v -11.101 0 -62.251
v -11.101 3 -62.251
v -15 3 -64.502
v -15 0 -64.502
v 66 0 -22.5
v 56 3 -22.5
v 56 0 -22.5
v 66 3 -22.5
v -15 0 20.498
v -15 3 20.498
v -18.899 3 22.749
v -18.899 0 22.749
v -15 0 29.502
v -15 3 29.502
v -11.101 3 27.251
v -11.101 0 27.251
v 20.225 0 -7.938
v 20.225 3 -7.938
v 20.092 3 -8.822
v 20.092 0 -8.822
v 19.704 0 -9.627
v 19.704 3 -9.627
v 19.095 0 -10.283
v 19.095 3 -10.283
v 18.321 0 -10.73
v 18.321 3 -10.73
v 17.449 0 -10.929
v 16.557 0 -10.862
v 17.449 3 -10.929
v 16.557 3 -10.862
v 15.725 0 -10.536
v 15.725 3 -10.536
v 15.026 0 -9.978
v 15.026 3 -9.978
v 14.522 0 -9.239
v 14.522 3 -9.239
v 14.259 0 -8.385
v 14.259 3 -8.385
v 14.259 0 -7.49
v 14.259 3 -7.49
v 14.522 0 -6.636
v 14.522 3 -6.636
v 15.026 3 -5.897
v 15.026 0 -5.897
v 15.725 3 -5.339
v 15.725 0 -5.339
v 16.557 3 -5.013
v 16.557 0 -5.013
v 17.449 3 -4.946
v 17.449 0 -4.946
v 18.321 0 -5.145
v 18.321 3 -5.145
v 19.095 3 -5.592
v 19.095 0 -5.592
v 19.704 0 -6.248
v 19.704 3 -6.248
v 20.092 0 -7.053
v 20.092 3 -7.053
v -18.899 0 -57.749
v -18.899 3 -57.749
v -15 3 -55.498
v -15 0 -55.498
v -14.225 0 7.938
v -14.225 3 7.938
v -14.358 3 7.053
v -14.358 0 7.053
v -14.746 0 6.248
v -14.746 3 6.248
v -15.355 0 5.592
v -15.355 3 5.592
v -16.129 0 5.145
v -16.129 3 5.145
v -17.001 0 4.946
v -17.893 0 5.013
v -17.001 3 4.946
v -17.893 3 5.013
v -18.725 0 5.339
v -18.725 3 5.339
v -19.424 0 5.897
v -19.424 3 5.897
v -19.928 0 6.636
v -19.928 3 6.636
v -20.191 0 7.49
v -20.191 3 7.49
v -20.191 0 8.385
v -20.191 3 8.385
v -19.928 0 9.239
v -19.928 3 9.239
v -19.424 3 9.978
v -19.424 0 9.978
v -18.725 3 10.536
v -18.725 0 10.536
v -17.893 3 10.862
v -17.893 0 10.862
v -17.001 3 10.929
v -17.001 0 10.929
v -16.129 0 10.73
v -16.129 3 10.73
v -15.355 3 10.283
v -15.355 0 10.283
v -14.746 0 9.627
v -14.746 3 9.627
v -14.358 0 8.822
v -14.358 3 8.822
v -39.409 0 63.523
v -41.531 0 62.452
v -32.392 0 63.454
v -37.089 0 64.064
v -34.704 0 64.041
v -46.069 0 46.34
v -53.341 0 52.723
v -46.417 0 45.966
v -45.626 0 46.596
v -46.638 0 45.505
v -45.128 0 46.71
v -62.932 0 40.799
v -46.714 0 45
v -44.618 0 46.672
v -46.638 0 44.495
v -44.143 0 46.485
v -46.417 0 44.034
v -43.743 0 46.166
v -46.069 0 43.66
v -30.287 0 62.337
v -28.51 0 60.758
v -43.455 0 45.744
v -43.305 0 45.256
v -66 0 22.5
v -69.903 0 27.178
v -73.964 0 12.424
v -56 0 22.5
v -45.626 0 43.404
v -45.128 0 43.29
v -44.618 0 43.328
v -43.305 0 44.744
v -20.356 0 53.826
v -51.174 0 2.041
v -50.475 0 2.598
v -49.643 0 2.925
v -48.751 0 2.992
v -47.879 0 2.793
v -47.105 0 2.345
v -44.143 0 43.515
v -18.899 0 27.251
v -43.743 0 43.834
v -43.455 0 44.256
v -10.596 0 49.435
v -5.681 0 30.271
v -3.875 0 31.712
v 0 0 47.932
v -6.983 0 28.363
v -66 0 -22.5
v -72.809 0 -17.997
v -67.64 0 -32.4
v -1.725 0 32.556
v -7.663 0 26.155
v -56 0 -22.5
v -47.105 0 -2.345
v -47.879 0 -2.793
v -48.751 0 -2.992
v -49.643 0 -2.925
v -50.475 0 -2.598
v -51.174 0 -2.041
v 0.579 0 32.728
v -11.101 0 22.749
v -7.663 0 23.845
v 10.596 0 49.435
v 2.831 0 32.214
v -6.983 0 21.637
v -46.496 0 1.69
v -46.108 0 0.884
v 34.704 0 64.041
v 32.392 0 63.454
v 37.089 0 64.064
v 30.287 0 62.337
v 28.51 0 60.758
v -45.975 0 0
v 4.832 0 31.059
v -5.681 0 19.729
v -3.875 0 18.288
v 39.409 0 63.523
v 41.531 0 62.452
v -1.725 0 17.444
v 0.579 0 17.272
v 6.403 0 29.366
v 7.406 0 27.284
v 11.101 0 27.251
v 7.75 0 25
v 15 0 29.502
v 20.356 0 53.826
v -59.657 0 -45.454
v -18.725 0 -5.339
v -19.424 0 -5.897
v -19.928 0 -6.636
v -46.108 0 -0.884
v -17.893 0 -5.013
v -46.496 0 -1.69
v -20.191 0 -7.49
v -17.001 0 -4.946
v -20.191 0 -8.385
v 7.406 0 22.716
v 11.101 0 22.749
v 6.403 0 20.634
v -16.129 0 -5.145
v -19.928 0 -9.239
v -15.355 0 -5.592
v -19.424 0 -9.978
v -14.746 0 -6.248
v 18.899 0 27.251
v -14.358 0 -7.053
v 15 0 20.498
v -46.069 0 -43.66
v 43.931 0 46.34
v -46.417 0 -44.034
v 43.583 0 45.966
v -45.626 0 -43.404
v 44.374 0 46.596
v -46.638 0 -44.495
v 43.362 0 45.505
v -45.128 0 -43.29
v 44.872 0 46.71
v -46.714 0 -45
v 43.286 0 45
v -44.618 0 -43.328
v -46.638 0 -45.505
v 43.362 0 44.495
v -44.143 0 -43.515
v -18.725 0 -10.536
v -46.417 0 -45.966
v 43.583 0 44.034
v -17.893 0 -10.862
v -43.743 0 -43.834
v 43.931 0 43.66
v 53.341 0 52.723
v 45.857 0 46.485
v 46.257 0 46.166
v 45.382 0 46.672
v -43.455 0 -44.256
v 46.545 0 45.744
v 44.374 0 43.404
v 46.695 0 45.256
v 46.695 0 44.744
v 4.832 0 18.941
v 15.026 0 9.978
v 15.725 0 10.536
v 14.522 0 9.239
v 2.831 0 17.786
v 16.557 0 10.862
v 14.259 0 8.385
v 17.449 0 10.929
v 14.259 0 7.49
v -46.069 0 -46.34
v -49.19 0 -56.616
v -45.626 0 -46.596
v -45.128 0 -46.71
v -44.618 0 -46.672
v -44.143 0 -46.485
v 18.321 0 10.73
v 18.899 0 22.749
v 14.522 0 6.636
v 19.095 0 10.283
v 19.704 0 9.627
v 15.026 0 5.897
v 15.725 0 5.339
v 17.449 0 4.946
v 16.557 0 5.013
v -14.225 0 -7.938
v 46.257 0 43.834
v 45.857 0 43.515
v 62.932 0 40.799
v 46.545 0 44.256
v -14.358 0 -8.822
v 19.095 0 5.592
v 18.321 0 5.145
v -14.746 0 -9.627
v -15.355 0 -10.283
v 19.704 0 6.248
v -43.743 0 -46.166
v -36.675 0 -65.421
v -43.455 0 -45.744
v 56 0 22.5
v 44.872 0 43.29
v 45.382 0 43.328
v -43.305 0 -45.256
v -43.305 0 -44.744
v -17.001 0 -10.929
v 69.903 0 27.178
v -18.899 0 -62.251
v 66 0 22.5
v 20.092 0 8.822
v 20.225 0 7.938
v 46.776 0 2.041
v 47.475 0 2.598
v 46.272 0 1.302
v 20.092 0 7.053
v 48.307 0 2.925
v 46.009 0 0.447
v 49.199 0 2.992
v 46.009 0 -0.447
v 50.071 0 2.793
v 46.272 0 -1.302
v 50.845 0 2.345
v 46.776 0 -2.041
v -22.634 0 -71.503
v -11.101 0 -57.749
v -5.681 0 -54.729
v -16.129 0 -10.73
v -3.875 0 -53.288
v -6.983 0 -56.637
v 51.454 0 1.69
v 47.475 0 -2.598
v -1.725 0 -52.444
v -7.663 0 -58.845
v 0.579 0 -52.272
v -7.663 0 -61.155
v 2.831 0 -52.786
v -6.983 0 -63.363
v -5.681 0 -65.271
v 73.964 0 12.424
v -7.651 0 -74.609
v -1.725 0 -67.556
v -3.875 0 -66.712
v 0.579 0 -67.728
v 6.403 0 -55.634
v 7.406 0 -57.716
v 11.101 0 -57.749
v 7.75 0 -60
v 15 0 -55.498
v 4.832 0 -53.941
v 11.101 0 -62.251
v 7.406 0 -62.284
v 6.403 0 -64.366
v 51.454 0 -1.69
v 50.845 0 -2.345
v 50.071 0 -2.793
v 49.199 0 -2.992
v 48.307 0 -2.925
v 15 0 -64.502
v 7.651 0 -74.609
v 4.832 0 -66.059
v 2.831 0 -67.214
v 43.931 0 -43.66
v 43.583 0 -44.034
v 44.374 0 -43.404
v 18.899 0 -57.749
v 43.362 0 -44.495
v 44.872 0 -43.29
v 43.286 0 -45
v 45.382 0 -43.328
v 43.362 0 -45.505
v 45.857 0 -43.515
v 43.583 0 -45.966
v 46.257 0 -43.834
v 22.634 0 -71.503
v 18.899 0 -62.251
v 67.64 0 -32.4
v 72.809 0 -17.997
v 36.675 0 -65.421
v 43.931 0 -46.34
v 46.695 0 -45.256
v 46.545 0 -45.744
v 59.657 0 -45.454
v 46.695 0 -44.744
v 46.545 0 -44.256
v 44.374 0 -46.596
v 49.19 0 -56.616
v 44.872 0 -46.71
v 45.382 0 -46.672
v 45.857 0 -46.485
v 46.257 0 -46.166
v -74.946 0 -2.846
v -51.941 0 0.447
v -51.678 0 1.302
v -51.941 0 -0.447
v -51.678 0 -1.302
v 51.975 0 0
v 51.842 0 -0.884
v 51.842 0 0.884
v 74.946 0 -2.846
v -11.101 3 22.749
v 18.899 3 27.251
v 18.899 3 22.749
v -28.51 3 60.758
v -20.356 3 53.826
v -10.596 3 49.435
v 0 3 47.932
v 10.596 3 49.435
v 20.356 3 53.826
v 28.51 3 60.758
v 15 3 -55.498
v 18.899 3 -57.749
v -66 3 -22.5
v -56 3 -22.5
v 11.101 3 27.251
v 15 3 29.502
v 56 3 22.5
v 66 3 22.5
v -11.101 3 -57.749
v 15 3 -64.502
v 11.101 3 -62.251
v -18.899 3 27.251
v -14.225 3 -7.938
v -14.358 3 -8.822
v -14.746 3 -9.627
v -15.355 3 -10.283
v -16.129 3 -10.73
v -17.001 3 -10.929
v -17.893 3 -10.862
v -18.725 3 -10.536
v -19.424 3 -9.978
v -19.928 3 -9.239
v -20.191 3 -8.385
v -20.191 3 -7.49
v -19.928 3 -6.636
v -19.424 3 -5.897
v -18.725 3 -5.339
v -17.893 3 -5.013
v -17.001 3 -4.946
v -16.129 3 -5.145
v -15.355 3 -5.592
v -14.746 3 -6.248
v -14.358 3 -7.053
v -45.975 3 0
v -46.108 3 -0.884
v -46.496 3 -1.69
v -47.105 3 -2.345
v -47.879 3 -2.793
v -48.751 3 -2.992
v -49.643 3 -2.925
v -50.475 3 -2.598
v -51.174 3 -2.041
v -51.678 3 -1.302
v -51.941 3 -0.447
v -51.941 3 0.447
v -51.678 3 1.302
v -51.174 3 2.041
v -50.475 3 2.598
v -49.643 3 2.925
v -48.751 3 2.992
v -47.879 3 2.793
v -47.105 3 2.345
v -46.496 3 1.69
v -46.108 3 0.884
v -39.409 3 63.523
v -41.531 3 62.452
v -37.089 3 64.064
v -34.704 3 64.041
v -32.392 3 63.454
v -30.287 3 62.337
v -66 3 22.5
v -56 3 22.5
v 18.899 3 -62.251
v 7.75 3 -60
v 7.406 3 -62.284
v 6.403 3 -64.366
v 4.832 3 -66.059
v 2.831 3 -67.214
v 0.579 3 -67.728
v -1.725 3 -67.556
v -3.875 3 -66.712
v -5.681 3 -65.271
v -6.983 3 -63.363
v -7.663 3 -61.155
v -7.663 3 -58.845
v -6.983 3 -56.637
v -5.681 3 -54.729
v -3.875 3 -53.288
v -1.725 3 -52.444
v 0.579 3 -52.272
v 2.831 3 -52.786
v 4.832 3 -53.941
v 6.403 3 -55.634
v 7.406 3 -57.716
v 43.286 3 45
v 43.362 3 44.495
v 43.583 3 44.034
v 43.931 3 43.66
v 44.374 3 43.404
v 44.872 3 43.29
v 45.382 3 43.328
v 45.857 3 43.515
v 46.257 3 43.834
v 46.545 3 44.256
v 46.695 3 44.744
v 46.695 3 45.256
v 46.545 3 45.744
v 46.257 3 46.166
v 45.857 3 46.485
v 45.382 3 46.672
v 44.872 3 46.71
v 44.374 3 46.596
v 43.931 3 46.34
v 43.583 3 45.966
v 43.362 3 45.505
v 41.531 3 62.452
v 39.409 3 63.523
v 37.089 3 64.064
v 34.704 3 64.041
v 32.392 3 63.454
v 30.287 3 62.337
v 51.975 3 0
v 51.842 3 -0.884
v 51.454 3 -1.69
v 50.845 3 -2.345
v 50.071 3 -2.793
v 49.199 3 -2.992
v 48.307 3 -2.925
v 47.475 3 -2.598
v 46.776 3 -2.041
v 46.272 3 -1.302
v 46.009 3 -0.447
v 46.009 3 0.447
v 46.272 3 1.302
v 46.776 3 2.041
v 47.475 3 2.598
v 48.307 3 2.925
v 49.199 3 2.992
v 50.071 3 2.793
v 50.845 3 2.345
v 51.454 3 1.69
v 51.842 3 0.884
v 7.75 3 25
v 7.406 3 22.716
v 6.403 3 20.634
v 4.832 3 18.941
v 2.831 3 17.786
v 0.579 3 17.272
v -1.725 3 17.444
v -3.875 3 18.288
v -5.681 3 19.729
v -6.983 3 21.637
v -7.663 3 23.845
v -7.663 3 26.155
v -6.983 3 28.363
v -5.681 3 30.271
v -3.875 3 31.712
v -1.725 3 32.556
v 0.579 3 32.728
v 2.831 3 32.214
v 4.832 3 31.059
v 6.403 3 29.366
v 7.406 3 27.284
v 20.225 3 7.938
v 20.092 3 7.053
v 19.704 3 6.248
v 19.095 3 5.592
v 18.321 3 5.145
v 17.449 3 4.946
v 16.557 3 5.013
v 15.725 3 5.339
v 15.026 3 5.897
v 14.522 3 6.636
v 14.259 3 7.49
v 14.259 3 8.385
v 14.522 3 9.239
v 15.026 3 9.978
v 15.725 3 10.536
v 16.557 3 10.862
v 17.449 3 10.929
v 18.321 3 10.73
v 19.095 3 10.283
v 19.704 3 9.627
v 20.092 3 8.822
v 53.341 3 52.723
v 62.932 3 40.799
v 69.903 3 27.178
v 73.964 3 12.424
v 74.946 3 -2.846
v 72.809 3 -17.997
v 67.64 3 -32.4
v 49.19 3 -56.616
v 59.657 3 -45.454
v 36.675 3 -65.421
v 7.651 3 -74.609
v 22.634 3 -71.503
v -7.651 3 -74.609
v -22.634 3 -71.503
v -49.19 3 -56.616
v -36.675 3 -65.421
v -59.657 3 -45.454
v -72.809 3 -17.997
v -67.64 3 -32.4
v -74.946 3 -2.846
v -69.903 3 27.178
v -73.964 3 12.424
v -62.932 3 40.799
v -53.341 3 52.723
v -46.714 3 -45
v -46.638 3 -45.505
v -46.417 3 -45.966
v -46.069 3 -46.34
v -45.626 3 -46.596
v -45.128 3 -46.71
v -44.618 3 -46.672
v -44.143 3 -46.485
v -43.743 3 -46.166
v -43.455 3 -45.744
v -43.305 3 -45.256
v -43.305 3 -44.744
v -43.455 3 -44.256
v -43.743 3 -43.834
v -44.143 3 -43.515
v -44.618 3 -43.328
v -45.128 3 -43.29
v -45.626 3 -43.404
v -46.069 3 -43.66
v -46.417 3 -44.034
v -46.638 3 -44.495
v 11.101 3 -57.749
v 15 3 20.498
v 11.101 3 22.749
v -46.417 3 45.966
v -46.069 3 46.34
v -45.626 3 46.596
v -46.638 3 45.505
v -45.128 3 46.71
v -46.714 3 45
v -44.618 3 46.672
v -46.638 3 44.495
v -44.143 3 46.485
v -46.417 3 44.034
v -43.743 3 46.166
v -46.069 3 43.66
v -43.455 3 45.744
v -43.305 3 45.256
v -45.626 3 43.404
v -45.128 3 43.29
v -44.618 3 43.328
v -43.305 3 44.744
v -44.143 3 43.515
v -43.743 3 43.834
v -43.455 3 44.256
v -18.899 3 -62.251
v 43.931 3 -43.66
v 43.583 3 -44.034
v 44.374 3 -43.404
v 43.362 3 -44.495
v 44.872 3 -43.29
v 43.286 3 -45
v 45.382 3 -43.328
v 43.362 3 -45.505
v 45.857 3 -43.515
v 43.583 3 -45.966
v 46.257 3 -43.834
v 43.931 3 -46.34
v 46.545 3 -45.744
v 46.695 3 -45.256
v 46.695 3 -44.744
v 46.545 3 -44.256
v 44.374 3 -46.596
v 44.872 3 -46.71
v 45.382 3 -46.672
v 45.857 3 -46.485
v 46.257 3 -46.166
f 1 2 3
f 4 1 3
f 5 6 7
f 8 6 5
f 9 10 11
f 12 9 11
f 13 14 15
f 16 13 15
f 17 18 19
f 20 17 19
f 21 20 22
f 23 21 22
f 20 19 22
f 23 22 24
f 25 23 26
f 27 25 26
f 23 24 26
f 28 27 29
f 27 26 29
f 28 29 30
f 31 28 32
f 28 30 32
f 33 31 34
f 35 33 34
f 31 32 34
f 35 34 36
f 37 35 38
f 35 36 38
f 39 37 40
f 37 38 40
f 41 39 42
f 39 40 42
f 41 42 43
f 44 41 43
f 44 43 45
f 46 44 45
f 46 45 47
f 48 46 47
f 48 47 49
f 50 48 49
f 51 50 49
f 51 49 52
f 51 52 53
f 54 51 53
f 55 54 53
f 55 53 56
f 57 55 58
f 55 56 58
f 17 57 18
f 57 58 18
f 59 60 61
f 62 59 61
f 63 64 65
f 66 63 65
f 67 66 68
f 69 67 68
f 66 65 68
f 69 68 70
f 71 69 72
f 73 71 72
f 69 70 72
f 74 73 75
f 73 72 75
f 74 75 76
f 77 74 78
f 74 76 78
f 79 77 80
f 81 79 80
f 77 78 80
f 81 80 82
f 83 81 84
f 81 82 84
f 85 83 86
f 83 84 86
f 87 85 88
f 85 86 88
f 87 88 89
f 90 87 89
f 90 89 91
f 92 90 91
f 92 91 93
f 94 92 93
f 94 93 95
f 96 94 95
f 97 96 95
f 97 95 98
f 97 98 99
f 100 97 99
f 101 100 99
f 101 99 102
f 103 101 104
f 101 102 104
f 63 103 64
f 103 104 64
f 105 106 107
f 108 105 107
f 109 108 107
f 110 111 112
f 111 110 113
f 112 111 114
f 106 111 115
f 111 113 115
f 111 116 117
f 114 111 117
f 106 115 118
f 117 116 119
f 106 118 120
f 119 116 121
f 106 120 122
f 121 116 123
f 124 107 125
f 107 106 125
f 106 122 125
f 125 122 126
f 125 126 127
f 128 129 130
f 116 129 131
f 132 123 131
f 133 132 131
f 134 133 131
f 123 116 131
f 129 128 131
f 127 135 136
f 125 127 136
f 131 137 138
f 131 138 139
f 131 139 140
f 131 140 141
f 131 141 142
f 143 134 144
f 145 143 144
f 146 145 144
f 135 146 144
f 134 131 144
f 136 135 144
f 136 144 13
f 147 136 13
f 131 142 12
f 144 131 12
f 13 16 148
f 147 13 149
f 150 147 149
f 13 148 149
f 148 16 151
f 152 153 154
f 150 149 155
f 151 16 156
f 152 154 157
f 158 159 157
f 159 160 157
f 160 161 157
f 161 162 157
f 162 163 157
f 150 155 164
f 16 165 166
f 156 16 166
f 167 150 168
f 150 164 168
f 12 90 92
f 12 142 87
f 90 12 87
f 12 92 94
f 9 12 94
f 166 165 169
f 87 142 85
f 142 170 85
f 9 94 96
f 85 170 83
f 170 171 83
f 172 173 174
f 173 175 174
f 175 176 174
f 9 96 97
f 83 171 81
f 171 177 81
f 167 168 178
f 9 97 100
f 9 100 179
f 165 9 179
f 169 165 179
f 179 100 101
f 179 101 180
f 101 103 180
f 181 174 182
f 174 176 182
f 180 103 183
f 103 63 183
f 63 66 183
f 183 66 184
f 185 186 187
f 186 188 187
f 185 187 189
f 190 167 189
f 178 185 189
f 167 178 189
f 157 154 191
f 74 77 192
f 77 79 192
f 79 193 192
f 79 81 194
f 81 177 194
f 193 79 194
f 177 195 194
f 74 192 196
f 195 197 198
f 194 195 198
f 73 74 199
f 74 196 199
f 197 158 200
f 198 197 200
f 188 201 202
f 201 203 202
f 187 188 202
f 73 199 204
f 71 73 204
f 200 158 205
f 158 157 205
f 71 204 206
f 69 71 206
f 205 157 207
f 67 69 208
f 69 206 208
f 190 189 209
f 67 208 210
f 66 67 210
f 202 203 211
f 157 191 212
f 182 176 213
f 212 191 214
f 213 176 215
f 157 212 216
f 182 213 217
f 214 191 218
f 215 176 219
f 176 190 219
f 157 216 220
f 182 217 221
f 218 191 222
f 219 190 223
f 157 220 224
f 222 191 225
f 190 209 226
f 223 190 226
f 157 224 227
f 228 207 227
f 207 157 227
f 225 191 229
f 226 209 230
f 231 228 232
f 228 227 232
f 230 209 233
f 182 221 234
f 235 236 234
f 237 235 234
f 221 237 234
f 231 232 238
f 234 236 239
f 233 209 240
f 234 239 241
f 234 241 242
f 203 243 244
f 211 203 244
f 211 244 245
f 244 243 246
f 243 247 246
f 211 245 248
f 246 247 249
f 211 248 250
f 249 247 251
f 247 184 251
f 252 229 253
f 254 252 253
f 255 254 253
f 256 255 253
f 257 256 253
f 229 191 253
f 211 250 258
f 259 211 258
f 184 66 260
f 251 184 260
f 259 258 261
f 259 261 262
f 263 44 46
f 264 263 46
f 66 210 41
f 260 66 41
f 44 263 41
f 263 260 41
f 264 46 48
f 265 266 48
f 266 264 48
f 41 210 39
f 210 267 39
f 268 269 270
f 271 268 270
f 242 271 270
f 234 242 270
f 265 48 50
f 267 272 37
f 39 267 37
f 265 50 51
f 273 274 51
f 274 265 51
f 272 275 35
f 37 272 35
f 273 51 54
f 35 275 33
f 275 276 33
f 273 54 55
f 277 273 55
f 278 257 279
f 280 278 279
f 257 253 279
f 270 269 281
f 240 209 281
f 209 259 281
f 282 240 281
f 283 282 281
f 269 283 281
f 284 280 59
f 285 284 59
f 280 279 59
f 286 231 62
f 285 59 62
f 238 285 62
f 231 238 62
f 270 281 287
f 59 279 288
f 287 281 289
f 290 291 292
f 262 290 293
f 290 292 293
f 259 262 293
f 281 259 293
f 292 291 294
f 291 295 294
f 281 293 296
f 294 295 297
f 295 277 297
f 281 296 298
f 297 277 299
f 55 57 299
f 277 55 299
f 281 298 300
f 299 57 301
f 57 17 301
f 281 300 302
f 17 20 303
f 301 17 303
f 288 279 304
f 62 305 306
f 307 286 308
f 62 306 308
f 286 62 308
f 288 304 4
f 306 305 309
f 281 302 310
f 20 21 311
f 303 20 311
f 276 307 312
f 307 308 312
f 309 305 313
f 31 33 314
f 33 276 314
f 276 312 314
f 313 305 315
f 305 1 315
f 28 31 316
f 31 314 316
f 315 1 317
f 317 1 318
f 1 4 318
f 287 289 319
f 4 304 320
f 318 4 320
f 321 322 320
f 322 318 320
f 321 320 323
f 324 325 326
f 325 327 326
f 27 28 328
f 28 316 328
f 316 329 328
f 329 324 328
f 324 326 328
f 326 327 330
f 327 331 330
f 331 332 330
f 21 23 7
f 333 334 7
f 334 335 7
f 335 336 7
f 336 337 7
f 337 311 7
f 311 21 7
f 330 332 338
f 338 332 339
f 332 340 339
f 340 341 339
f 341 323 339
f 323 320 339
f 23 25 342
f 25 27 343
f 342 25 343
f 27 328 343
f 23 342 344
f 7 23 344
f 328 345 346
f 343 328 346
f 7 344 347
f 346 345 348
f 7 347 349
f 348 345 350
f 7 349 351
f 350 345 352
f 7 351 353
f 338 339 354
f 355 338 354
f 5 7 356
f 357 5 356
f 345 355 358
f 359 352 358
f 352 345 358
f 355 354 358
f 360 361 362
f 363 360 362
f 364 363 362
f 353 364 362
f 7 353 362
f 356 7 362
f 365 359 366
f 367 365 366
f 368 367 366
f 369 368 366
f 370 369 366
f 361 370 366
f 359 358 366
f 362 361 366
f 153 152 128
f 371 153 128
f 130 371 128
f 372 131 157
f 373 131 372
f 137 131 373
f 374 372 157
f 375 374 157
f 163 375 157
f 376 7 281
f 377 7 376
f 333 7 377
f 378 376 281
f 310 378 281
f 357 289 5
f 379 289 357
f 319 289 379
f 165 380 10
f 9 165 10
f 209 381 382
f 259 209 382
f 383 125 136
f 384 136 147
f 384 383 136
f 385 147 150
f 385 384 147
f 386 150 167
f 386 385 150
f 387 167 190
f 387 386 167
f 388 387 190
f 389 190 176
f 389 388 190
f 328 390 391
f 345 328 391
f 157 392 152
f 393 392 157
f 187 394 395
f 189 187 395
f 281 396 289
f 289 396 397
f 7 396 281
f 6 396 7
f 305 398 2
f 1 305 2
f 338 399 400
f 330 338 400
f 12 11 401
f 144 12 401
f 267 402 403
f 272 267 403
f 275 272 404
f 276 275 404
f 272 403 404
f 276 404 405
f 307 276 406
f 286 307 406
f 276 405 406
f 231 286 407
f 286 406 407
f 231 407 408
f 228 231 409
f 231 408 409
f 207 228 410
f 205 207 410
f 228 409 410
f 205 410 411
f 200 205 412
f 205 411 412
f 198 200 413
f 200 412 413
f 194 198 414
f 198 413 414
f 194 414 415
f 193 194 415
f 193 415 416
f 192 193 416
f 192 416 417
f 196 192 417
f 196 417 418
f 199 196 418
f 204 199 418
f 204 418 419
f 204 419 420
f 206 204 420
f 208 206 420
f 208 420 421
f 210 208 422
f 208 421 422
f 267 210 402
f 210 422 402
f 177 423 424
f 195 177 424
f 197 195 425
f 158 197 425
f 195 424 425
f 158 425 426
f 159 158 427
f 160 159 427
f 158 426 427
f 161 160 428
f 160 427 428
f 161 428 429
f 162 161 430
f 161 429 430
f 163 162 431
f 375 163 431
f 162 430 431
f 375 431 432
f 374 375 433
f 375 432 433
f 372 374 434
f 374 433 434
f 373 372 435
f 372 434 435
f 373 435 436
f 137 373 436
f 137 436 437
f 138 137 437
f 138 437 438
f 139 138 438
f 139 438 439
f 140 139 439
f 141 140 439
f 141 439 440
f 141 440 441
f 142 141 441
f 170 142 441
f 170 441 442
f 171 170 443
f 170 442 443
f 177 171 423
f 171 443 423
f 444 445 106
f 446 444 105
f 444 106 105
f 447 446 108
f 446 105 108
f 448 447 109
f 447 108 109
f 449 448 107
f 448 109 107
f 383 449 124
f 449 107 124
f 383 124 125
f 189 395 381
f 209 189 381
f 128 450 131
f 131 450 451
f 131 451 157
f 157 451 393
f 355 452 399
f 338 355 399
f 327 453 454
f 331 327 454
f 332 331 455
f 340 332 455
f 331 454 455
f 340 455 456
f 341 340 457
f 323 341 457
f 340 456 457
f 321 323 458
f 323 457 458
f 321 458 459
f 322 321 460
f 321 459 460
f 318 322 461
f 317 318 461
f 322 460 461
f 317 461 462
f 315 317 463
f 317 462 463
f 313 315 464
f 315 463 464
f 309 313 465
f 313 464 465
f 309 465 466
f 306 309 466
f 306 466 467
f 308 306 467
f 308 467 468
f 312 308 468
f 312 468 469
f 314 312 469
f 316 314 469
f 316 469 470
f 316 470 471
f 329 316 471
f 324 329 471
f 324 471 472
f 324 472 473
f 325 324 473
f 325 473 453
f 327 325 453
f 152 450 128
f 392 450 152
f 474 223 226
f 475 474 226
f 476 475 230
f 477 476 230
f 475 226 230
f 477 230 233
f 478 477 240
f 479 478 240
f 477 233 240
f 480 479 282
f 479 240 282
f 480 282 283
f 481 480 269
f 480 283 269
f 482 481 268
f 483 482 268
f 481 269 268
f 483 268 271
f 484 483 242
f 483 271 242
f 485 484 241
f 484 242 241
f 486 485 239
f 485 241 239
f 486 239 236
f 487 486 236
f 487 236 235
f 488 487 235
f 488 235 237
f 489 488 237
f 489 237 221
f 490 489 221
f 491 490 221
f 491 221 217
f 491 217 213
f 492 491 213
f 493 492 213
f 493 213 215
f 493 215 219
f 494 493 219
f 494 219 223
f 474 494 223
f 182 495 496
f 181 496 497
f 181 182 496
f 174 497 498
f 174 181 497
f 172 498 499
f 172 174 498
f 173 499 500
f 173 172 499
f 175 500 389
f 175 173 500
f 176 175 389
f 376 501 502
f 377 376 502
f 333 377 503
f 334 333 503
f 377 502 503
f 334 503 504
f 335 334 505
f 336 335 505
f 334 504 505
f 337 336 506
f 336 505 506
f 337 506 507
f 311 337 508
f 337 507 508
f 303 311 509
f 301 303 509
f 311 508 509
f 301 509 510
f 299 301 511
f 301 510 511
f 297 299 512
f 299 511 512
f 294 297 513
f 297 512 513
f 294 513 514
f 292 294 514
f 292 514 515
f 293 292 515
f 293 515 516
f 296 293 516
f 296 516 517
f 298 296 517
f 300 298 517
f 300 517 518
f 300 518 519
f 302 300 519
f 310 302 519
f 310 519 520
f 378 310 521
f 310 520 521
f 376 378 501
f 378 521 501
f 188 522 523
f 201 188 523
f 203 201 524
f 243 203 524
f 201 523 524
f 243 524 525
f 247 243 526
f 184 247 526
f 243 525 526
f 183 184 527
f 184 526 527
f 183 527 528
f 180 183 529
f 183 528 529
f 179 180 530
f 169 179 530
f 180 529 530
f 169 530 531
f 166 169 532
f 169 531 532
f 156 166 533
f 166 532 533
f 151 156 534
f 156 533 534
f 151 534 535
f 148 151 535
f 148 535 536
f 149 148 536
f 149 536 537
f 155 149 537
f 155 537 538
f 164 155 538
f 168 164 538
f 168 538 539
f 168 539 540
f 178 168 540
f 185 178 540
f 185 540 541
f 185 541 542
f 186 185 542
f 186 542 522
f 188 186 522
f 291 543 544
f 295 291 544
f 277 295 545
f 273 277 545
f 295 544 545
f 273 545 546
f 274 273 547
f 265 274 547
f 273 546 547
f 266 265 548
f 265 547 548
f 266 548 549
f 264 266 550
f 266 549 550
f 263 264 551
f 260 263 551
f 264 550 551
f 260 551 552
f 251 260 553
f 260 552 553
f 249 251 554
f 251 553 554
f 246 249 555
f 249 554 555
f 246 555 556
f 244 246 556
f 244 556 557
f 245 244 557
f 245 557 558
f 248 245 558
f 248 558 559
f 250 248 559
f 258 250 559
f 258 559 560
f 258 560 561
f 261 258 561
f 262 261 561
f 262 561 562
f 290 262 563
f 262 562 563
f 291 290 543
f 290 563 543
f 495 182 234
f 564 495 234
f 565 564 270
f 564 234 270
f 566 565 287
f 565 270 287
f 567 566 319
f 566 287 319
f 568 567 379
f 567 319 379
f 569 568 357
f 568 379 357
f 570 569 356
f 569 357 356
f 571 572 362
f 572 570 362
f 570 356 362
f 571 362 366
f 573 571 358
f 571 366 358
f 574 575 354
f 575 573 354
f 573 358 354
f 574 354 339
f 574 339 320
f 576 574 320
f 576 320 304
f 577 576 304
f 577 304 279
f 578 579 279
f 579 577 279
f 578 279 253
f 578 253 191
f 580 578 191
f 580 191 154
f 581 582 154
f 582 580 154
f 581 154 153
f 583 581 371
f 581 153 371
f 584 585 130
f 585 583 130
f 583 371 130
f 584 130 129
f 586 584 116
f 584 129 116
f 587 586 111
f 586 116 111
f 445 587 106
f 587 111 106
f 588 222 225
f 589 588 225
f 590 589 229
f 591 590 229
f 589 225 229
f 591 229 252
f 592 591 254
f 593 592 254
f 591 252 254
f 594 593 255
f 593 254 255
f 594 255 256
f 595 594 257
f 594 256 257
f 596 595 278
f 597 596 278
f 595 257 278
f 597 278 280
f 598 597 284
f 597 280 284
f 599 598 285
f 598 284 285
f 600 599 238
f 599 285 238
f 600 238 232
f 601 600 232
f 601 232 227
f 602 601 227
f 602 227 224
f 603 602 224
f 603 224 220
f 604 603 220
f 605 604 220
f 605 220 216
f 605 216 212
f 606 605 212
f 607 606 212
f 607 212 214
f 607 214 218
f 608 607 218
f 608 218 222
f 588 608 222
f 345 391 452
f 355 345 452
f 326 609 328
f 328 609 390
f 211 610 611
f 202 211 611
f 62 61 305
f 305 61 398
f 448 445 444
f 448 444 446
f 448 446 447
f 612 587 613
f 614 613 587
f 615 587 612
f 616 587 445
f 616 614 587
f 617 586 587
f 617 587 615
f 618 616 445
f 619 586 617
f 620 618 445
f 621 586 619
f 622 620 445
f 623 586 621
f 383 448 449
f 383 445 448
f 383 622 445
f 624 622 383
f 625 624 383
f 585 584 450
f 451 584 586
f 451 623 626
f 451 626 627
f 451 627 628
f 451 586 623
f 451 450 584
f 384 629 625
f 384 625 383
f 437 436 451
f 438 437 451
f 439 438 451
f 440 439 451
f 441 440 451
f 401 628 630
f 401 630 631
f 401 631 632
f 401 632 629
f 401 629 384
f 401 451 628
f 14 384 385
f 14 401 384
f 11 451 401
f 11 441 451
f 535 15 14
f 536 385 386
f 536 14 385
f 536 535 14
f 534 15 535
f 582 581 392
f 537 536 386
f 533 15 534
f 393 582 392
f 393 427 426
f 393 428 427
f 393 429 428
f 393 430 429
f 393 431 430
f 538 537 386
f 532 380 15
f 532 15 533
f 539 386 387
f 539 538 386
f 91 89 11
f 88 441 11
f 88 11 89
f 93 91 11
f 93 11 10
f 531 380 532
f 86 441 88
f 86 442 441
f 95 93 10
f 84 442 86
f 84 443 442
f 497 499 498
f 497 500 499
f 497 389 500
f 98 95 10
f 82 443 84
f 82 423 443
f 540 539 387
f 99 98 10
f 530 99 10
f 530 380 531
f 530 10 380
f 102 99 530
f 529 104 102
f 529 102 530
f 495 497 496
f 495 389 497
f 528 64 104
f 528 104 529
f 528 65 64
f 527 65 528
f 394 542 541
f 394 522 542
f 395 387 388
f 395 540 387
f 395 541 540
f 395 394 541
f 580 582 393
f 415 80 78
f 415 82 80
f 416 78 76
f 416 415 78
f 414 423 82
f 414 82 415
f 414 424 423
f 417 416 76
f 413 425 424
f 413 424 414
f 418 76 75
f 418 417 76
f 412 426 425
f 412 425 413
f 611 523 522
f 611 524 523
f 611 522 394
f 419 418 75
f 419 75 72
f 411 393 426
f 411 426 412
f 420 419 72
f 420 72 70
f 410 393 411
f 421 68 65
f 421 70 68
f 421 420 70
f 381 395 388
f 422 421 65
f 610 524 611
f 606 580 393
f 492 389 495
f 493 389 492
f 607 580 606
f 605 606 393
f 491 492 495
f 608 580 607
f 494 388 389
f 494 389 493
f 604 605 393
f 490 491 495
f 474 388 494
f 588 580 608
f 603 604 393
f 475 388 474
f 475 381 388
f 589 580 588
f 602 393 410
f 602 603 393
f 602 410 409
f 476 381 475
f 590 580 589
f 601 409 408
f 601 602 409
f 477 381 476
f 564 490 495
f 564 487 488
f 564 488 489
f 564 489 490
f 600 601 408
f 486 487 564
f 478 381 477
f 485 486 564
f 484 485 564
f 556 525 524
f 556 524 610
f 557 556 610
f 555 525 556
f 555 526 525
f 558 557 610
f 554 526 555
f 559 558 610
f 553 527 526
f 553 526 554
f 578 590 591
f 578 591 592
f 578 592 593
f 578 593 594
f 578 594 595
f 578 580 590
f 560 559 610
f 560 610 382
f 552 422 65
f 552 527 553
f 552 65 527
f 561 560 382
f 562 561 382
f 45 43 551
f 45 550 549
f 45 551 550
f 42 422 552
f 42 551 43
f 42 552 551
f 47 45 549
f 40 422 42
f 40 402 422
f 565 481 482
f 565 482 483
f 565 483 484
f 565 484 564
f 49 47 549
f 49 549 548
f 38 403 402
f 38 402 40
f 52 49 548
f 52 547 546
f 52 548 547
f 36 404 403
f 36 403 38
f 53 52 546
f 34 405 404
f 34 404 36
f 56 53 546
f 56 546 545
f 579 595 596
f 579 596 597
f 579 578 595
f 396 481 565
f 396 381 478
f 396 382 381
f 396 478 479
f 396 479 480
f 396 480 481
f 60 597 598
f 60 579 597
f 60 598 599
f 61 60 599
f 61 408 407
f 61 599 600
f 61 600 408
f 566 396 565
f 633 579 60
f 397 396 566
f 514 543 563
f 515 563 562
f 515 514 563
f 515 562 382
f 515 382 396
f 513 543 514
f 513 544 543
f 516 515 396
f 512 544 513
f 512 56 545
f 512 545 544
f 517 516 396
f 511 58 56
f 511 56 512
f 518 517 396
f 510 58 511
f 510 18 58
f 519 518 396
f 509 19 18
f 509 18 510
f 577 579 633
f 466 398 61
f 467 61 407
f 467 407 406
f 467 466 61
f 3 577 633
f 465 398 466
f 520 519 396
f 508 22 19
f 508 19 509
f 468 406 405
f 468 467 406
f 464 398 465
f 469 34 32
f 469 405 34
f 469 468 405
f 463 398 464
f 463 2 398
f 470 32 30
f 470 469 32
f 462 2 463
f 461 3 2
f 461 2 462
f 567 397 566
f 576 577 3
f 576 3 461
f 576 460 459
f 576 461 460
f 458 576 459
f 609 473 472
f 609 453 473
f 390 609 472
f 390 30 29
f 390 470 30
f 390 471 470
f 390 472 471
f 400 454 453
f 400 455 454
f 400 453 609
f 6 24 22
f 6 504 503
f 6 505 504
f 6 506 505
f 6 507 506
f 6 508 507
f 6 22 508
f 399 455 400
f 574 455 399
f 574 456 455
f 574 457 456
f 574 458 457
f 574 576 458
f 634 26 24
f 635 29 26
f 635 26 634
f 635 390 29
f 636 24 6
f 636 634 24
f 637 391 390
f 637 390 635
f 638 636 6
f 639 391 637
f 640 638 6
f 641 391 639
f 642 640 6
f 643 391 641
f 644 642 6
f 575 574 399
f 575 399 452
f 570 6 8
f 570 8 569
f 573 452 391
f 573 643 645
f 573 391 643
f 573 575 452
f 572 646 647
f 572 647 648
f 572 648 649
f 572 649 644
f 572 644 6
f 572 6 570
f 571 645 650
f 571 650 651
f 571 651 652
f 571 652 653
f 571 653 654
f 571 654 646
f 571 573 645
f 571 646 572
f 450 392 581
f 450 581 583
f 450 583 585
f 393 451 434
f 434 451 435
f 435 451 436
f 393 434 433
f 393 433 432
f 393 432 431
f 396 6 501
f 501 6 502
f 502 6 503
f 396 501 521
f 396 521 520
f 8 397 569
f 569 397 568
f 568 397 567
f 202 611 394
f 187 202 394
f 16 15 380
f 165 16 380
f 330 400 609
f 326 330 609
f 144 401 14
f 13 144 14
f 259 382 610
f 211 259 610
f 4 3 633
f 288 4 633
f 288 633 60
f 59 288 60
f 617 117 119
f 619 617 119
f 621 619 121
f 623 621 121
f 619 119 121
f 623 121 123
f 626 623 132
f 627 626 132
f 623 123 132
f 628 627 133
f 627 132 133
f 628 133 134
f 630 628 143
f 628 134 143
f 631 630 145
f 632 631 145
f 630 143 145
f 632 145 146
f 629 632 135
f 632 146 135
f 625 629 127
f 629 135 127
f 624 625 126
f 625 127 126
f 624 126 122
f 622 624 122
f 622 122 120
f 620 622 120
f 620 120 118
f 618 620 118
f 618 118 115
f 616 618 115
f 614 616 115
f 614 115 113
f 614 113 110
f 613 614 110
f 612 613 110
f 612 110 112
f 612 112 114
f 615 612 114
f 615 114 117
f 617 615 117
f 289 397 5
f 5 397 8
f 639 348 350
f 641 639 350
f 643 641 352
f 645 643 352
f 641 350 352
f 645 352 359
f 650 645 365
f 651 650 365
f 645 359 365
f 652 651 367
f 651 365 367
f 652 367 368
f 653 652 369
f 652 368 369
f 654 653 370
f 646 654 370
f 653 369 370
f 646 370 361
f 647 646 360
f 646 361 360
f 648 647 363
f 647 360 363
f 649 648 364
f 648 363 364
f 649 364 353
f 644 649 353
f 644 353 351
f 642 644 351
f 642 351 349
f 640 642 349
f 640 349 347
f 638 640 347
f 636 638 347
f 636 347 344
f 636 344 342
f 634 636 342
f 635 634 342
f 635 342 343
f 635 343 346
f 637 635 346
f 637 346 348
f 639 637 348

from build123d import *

# Parameters (mm, degrees)
SKETCH1_R           = 75
BOSS_EXTRUDE1_DEPTH = 3
SKETCH2_W           = 10
SKETCH2_H           = 45
CUT_EXTRUDE1_DEPTH  = 6.35
SKETCH3_R           = 7.75
CUT_EXTRUDE2_DEPTH  = 10
CUT_EXTRUDE3_DEPTH  = 10
FILLET2_R           = 10
SKETCH7_R           = 3
CUT_EXTRUDE5_DEPTH  = 3
CUT_EXTRUDE6_DEPTH  = 3
SKETCH8_R           = 1.7145
CUT_EXTRUDE7_DEPTH  = 10


with BuildPart() as part:
    # Sketch1 → Boss-Extrude1 (new body)
    with BuildSketch(Plane(origin=(0, 0, 0), x_dir=(1, 0, 0), z_dir=(0, 1, 0))):
        Circle(SKETCH1_R)
    extrude(amount=BOSS_EXTRUDE1_DEPTH)

    # Sketch2 → Cut-Extrude1 (cut)
    with BuildSketch(Plane(origin=(0, 3, 0), x_dir=(1, 0, 0), z_dir=(0, 1, 0))):
        with Locations((-61, 0)):
            Rectangle(SKETCH2_W, SKETCH2_H)
        with Locations((61, 0)):
            Rectangle(SKETCH2_W, SKETCH2_H)
    extrude(amount=-CUT_EXTRUDE1_DEPTH, mode=Mode.SUBTRACT)

    # Sketch3 → Cut-Extrude2 (cut)
    with BuildSketch(Plane(origin=(0, 3, 0), x_dir=(1, 0, 0), z_dir=(0, 1, 0))):
        with Locations((0, -25)):
            Circle(SKETCH3_R)
        with Locations((0, 60)):
            Circle(SKETCH3_R)
    extrude(amount=-CUT_EXTRUDE2_DEPTH, mode=Mode.SUBTRACT)

    # Sketch4 → Cut-Extrude3 (cut)
    with BuildSketch(Plane(origin=(0, 3, 0), x_dir=(1, 0, 0), z_dir=(0, 1, 0))):
        with BuildLine():
            ThreePointArc((-33.160552015, -67.270928268), (0, -47.932265908), (33.160552015, -67.270928268))
            ThreePointArc((33.160552015, -67.270928268), (0, -75), (-33.160552015, -67.270928268))
        make_face()
    extrude(amount=-CUT_EXTRUDE3_DEPTH, mode=Mode.SUBTRACT)

    # Fillet2
    fillet2_edges = [part.edges().sort_by_distance(p)[0] for p in [
        (-33.160552015, 1.5, 67.270928268),
        (33.160552015, 1.5, 67.270928268),
    ]]
    fillet(fillet2_edges, radius=FILLET2_R)

    # Sketch7 → Cut-Extrude5 (cut)
    with BuildSketch(Plane(origin=(0, 3, 0), x_dir=(1, 0, 0), z_dir=(0, 1, 0))):
        with Locations((-48.975, 0)):
            Circle(SKETCH7_R)
        with Locations((-17.225, -7.9375)):
            Circle(SKETCH7_R)
        with Locations((-17.225, 7.9375)):
            Circle(SKETCH7_R)
        with Locations((17.225, 7.9375)):
            Circle(SKETCH7_R)
        with Locations((17.225, -7.9375)):
            Circle(SKETCH7_R)
        with Locations((48.975, 0)):
            Circle(SKETCH7_R)
    extrude(amount=-CUT_EXTRUDE5_DEPTH, mode=Mode.SUBTRACT)

    # Sketch6 → Cut-Extrude6 (cut)
    with BuildSketch(Plane(origin=(0, 3, 0), x_dir=(1, 0, 0), z_dir=(0, 1, 0))):
        Polygon((-15, 64.502061929), (-18.8989, 62.251030965), (-18.8989, 57.748969035), (-15, 55.497938071), (-11.1011, 57.748969035), (-11.1011, 62.251030965), align=None)
        Polygon((15, 64.502061929), (11.1011, 62.251030965), (11.1011, 57.748969035), (15, 55.497938071), (18.8989, 57.748969035), (18.8989, 62.251030965), align=None)
        Polygon((-15, -20.497938071), (-18.8989, -22.748969035), (-18.8989, -27.251030965), (-15, -29.502061929), (-11.1011, -27.251030965), (-11.1011, -22.748969035), align=None)
        Polygon((15, -20.497938071), (11.1011, -22.748969035), (11.1011, -27.251030965), (15, -29.502061929), (18.8989, -27.251030965), (18.8989, -22.748969035), align=None)
    extrude(amount=-CUT_EXTRUDE6_DEPTH, mode=Mode.SUBTRACT)

    # Sketch8 → Cut-Extrude7 (cut)
    with BuildSketch(Plane(origin=(0, 0, 0), x_dir=(-1, 0, 0), z_dir=(0, -1, 0))):
        with Locations((45, -45)):
            Circle(SKETCH8_R)
        with Locations((-45, -45)):
            Circle(SKETCH8_R)
        with Locations((-45, 45)):
            Circle(SKETCH8_R)
        with Locations((45, 45)):
            Circle(SKETCH8_R)
    extrude(amount=-CUT_EXTRUDE7_DEPTH, mode=Mode.SUBTRACT)


solid = part.part
